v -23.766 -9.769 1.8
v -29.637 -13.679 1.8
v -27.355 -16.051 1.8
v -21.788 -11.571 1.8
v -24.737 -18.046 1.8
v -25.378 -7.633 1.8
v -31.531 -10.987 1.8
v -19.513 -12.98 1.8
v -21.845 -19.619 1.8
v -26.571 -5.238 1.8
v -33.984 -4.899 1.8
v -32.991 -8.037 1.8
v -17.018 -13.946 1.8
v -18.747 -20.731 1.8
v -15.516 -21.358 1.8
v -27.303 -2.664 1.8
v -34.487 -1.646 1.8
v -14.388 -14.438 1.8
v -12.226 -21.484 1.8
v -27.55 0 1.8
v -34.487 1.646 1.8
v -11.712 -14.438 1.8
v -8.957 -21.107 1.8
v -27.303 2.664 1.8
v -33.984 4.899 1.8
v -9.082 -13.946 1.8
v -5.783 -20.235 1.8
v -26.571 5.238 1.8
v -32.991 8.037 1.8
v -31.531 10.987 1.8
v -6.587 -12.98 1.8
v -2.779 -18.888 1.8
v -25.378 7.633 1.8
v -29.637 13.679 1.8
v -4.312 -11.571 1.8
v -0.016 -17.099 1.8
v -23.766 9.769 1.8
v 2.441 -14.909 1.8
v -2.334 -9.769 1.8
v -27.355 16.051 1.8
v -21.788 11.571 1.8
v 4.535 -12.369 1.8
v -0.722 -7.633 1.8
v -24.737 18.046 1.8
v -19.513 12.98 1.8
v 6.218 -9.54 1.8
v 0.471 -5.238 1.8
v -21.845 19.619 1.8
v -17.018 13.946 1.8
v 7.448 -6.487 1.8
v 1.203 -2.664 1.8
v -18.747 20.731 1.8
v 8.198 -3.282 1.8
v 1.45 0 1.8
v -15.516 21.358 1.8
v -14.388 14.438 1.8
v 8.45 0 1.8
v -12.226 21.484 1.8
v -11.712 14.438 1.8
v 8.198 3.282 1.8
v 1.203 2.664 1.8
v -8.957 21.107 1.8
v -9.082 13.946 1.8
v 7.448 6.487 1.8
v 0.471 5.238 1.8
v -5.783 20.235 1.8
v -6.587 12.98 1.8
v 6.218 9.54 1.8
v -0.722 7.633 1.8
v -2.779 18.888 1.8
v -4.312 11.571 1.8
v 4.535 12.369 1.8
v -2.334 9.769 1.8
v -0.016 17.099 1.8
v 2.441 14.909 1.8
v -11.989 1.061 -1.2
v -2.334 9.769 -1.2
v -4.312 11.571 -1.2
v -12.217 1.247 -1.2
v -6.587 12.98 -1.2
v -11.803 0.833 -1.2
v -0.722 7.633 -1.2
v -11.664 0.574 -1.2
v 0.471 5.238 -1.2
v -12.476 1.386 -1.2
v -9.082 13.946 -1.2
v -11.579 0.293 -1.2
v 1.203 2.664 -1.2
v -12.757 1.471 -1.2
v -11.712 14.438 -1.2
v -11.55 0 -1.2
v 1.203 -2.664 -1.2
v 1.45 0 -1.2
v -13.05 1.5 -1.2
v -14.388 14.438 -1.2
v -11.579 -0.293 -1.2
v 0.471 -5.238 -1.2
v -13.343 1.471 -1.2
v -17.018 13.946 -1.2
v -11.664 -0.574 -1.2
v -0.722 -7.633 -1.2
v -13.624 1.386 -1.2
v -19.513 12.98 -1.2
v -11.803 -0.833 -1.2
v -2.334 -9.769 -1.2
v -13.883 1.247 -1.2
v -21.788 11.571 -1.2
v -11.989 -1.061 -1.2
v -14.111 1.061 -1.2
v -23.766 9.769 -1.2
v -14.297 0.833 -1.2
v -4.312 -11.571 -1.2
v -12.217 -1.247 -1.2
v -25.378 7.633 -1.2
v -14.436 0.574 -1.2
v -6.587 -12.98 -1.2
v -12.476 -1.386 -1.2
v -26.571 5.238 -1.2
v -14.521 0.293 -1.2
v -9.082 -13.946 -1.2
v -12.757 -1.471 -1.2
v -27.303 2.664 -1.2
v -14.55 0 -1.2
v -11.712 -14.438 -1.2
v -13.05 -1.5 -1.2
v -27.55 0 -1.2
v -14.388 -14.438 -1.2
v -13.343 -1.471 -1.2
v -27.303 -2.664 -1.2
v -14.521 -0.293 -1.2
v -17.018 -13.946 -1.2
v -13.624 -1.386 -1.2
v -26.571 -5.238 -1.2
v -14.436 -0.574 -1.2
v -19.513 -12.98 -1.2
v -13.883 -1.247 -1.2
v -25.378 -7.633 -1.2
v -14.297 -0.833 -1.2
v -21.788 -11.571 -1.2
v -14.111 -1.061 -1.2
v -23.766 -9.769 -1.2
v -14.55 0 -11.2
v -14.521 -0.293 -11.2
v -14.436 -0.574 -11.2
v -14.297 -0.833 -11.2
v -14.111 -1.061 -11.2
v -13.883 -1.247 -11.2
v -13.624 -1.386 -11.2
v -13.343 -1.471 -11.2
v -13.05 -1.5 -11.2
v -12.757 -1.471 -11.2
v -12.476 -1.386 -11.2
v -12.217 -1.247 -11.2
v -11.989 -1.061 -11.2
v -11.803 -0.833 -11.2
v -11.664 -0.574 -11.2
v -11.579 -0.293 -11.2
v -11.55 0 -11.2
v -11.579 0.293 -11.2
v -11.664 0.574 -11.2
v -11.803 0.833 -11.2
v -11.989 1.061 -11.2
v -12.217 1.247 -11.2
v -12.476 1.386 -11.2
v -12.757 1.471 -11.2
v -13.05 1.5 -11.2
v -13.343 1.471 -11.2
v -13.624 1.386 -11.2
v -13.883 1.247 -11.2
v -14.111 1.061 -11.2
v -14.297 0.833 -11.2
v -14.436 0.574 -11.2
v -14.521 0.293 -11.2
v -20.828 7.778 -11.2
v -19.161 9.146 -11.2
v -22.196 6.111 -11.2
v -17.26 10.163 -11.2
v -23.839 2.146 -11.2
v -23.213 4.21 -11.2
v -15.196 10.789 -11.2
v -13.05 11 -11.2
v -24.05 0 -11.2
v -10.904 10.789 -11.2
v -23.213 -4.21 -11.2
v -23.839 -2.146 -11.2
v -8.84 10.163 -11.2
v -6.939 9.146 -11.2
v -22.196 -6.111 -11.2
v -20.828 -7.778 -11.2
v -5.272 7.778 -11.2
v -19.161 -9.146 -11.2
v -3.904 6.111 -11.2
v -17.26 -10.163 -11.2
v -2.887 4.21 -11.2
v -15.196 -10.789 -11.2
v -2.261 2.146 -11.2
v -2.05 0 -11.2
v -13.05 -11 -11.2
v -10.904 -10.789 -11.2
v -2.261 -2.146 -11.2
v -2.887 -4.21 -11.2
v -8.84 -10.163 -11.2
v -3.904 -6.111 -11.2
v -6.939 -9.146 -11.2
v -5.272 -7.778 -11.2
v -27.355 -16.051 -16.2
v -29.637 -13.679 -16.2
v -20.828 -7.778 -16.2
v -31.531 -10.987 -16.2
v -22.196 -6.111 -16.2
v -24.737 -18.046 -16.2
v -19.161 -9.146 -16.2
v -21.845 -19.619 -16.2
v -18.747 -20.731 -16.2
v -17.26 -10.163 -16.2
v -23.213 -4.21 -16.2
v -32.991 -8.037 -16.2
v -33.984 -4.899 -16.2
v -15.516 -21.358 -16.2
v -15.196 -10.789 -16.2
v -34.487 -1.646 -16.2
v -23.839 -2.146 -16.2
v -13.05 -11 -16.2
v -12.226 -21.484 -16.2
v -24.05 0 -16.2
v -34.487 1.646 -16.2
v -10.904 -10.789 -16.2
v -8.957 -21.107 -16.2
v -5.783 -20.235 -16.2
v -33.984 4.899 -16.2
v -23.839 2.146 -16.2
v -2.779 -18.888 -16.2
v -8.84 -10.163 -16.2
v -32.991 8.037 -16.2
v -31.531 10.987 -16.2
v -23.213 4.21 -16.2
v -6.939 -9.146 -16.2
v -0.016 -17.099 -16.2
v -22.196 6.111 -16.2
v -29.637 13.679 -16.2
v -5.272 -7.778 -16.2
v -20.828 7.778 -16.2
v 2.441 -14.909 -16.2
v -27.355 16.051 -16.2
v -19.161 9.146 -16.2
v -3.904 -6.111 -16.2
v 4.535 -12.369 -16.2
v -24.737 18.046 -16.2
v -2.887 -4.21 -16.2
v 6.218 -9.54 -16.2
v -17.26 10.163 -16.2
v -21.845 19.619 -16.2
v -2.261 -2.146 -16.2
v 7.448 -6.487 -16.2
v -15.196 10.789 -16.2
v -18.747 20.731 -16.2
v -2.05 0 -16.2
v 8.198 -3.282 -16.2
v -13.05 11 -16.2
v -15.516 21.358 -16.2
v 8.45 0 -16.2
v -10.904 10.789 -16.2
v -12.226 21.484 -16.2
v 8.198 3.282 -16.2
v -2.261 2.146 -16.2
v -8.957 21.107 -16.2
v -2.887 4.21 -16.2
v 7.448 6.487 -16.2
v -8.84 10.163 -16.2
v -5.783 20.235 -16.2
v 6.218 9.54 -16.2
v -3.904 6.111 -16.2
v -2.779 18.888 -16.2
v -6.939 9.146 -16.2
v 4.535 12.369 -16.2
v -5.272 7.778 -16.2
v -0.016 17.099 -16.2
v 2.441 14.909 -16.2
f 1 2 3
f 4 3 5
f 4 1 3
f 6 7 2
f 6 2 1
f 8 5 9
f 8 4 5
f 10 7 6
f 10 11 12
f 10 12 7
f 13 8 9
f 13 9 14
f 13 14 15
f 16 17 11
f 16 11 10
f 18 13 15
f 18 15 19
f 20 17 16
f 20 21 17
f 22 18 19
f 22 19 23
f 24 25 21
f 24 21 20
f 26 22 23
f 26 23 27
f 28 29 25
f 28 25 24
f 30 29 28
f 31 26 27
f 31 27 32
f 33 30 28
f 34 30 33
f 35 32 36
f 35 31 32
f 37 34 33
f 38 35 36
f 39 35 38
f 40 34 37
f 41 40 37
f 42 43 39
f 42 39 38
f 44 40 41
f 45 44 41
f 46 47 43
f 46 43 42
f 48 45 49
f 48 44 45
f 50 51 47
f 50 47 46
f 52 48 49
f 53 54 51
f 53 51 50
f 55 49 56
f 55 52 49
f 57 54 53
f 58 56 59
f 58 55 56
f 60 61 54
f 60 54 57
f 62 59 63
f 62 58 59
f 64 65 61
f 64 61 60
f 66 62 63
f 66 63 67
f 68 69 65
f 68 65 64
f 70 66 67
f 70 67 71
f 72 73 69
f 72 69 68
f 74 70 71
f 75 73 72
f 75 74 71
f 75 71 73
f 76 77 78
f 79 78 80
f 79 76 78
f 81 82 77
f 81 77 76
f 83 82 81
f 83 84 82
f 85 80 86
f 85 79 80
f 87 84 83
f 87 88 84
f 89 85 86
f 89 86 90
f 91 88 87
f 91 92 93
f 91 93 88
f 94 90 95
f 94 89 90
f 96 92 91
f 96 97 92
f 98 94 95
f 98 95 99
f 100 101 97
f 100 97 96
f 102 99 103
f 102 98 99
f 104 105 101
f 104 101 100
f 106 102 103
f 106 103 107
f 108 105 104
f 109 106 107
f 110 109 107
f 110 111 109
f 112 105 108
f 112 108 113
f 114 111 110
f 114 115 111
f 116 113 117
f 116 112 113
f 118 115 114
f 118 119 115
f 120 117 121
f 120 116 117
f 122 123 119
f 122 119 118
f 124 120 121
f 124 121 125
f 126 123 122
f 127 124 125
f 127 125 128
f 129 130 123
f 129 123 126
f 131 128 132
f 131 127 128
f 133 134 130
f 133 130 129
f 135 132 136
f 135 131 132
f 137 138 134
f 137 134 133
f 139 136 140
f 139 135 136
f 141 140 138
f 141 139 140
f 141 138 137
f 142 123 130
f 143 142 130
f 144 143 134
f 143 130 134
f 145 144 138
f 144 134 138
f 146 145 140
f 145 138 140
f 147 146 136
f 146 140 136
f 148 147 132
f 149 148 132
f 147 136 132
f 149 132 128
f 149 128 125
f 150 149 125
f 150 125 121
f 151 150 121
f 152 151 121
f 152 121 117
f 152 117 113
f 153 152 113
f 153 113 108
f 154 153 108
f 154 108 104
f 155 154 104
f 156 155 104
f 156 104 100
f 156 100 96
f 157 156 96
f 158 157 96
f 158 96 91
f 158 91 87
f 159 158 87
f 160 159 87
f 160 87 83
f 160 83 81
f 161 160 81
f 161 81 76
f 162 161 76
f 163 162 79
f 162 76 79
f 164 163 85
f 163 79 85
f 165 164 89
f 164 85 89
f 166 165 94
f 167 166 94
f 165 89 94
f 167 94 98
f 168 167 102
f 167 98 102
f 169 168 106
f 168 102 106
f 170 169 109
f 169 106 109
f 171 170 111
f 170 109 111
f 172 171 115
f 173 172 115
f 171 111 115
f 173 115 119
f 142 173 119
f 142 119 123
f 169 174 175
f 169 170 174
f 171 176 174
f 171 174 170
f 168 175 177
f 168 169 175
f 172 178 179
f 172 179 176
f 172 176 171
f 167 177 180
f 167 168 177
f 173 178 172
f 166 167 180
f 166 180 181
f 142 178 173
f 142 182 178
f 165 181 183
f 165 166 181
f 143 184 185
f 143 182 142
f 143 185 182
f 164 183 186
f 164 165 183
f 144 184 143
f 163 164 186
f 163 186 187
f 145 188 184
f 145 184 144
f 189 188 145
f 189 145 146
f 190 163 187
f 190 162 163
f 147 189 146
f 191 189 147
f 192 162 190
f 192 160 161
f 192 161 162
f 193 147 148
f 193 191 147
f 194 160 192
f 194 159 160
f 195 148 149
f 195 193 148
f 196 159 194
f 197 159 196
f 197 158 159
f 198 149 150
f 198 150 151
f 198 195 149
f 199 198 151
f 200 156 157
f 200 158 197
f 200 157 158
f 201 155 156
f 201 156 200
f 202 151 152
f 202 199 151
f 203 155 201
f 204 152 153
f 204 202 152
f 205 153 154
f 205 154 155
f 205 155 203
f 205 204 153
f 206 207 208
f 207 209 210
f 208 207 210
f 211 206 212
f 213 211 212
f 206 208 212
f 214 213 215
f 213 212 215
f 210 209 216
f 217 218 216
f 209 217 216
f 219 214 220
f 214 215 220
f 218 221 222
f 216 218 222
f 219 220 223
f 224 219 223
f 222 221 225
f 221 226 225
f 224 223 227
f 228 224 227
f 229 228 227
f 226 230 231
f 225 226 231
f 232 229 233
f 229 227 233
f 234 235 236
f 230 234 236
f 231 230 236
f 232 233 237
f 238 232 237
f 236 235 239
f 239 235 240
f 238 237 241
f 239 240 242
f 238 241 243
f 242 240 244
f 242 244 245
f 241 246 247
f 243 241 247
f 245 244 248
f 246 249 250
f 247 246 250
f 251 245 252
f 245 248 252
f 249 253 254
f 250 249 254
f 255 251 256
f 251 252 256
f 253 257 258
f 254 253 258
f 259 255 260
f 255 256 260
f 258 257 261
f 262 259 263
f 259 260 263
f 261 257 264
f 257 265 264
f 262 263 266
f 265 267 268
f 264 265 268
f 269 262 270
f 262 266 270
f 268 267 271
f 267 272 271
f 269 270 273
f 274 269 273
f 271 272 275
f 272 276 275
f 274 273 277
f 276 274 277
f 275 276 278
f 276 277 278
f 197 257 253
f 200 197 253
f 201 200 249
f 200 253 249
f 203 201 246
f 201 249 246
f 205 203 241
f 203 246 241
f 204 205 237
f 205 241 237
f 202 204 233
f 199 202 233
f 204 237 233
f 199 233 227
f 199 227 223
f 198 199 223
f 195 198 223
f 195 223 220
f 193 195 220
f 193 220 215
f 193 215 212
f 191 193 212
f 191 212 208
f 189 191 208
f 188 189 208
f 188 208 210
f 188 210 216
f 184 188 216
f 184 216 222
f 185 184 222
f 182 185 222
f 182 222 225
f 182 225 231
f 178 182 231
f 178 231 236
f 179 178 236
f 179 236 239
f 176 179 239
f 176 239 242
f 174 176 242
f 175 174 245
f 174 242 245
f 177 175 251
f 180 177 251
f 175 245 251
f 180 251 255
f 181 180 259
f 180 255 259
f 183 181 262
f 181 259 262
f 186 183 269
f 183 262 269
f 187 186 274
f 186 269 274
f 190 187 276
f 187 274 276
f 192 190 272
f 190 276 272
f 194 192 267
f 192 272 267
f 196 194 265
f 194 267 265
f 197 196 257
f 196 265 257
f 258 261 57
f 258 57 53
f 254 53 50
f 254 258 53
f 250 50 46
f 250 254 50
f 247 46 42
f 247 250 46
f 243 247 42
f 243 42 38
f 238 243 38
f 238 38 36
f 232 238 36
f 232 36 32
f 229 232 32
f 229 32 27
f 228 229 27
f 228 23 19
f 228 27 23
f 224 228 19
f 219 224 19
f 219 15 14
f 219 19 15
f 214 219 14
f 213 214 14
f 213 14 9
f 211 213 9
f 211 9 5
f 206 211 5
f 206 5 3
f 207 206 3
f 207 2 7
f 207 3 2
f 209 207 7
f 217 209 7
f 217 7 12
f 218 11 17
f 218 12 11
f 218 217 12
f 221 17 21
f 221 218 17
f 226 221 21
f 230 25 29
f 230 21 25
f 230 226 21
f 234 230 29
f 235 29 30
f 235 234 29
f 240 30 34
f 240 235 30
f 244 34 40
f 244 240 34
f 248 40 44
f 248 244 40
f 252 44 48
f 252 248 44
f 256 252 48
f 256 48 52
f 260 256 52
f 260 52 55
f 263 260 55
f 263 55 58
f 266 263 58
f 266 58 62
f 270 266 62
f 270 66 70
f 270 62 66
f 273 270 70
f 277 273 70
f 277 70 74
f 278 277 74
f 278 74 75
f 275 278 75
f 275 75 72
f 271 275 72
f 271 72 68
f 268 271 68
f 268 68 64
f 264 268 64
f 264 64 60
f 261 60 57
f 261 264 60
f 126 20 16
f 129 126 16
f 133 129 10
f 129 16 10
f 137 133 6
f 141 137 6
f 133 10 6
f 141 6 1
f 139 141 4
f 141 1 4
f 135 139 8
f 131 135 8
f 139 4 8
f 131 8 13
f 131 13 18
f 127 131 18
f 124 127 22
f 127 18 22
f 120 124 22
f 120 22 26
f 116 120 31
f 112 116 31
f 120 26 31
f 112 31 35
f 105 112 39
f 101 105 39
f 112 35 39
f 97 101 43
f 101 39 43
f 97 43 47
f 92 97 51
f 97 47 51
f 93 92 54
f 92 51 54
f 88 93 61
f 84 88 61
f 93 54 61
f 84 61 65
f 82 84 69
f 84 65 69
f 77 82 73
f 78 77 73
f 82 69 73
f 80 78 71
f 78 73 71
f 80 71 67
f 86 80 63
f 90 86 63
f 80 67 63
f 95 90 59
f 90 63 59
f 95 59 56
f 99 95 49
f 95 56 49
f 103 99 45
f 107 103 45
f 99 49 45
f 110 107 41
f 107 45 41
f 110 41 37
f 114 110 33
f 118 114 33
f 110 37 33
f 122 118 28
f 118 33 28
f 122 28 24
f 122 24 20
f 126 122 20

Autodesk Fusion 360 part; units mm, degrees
sketch "Esquisse1" plane through (0, 0, 0) normal (0, 0, 1) x (1, 0, 0)
  circle A0 centre (0, 0) radius 2.15
  dimension "d1" = 4.3
extrude "Extrusion1" add sketch "Esquisse1" along normal blind 1.8
sketch "Esquisse2" plane through (0, 0, 1.8) normal (0, 0, 1) x (-1, 0, 0)
  circle A0 centre (0, 0) radius 2.15
  circle A1 centre (0, 0) radius 1.45
  dimension "d4" = 2.9
extrude "Extrusion2" cut sketch "Esquisse2" against normal blind 0.3 contours A1
sketch "Esquisse3" plane through (0, 0, 0) normal (0, 0, -1) x (1, 0, 0)
  circle A0 centre (0, 0) radius 2.15
  circle A1 centre (0, 0) radius 1.1
  dimension "d7" = 2.2
extrude "Extrusion3" cut sketch "Esquisse3" against normal blind 0.5 contours A1
sketch "Esquisse4" plane through (0, 0, 1.5) normal (0, 0, 1) x (-1, 0, 0)
  circle A0 centre (0, 0) radius 1.45
  circle A1 centre (0, 0) radius 0.15
  dimension "d10" = 0.3
extrude "Extrusion4" cut sketch "Esquisse4" against normal blind 3.8 contours A1
scale "Echelle1" factor 10 about (1.45, 0, 1.8) bodies 1
